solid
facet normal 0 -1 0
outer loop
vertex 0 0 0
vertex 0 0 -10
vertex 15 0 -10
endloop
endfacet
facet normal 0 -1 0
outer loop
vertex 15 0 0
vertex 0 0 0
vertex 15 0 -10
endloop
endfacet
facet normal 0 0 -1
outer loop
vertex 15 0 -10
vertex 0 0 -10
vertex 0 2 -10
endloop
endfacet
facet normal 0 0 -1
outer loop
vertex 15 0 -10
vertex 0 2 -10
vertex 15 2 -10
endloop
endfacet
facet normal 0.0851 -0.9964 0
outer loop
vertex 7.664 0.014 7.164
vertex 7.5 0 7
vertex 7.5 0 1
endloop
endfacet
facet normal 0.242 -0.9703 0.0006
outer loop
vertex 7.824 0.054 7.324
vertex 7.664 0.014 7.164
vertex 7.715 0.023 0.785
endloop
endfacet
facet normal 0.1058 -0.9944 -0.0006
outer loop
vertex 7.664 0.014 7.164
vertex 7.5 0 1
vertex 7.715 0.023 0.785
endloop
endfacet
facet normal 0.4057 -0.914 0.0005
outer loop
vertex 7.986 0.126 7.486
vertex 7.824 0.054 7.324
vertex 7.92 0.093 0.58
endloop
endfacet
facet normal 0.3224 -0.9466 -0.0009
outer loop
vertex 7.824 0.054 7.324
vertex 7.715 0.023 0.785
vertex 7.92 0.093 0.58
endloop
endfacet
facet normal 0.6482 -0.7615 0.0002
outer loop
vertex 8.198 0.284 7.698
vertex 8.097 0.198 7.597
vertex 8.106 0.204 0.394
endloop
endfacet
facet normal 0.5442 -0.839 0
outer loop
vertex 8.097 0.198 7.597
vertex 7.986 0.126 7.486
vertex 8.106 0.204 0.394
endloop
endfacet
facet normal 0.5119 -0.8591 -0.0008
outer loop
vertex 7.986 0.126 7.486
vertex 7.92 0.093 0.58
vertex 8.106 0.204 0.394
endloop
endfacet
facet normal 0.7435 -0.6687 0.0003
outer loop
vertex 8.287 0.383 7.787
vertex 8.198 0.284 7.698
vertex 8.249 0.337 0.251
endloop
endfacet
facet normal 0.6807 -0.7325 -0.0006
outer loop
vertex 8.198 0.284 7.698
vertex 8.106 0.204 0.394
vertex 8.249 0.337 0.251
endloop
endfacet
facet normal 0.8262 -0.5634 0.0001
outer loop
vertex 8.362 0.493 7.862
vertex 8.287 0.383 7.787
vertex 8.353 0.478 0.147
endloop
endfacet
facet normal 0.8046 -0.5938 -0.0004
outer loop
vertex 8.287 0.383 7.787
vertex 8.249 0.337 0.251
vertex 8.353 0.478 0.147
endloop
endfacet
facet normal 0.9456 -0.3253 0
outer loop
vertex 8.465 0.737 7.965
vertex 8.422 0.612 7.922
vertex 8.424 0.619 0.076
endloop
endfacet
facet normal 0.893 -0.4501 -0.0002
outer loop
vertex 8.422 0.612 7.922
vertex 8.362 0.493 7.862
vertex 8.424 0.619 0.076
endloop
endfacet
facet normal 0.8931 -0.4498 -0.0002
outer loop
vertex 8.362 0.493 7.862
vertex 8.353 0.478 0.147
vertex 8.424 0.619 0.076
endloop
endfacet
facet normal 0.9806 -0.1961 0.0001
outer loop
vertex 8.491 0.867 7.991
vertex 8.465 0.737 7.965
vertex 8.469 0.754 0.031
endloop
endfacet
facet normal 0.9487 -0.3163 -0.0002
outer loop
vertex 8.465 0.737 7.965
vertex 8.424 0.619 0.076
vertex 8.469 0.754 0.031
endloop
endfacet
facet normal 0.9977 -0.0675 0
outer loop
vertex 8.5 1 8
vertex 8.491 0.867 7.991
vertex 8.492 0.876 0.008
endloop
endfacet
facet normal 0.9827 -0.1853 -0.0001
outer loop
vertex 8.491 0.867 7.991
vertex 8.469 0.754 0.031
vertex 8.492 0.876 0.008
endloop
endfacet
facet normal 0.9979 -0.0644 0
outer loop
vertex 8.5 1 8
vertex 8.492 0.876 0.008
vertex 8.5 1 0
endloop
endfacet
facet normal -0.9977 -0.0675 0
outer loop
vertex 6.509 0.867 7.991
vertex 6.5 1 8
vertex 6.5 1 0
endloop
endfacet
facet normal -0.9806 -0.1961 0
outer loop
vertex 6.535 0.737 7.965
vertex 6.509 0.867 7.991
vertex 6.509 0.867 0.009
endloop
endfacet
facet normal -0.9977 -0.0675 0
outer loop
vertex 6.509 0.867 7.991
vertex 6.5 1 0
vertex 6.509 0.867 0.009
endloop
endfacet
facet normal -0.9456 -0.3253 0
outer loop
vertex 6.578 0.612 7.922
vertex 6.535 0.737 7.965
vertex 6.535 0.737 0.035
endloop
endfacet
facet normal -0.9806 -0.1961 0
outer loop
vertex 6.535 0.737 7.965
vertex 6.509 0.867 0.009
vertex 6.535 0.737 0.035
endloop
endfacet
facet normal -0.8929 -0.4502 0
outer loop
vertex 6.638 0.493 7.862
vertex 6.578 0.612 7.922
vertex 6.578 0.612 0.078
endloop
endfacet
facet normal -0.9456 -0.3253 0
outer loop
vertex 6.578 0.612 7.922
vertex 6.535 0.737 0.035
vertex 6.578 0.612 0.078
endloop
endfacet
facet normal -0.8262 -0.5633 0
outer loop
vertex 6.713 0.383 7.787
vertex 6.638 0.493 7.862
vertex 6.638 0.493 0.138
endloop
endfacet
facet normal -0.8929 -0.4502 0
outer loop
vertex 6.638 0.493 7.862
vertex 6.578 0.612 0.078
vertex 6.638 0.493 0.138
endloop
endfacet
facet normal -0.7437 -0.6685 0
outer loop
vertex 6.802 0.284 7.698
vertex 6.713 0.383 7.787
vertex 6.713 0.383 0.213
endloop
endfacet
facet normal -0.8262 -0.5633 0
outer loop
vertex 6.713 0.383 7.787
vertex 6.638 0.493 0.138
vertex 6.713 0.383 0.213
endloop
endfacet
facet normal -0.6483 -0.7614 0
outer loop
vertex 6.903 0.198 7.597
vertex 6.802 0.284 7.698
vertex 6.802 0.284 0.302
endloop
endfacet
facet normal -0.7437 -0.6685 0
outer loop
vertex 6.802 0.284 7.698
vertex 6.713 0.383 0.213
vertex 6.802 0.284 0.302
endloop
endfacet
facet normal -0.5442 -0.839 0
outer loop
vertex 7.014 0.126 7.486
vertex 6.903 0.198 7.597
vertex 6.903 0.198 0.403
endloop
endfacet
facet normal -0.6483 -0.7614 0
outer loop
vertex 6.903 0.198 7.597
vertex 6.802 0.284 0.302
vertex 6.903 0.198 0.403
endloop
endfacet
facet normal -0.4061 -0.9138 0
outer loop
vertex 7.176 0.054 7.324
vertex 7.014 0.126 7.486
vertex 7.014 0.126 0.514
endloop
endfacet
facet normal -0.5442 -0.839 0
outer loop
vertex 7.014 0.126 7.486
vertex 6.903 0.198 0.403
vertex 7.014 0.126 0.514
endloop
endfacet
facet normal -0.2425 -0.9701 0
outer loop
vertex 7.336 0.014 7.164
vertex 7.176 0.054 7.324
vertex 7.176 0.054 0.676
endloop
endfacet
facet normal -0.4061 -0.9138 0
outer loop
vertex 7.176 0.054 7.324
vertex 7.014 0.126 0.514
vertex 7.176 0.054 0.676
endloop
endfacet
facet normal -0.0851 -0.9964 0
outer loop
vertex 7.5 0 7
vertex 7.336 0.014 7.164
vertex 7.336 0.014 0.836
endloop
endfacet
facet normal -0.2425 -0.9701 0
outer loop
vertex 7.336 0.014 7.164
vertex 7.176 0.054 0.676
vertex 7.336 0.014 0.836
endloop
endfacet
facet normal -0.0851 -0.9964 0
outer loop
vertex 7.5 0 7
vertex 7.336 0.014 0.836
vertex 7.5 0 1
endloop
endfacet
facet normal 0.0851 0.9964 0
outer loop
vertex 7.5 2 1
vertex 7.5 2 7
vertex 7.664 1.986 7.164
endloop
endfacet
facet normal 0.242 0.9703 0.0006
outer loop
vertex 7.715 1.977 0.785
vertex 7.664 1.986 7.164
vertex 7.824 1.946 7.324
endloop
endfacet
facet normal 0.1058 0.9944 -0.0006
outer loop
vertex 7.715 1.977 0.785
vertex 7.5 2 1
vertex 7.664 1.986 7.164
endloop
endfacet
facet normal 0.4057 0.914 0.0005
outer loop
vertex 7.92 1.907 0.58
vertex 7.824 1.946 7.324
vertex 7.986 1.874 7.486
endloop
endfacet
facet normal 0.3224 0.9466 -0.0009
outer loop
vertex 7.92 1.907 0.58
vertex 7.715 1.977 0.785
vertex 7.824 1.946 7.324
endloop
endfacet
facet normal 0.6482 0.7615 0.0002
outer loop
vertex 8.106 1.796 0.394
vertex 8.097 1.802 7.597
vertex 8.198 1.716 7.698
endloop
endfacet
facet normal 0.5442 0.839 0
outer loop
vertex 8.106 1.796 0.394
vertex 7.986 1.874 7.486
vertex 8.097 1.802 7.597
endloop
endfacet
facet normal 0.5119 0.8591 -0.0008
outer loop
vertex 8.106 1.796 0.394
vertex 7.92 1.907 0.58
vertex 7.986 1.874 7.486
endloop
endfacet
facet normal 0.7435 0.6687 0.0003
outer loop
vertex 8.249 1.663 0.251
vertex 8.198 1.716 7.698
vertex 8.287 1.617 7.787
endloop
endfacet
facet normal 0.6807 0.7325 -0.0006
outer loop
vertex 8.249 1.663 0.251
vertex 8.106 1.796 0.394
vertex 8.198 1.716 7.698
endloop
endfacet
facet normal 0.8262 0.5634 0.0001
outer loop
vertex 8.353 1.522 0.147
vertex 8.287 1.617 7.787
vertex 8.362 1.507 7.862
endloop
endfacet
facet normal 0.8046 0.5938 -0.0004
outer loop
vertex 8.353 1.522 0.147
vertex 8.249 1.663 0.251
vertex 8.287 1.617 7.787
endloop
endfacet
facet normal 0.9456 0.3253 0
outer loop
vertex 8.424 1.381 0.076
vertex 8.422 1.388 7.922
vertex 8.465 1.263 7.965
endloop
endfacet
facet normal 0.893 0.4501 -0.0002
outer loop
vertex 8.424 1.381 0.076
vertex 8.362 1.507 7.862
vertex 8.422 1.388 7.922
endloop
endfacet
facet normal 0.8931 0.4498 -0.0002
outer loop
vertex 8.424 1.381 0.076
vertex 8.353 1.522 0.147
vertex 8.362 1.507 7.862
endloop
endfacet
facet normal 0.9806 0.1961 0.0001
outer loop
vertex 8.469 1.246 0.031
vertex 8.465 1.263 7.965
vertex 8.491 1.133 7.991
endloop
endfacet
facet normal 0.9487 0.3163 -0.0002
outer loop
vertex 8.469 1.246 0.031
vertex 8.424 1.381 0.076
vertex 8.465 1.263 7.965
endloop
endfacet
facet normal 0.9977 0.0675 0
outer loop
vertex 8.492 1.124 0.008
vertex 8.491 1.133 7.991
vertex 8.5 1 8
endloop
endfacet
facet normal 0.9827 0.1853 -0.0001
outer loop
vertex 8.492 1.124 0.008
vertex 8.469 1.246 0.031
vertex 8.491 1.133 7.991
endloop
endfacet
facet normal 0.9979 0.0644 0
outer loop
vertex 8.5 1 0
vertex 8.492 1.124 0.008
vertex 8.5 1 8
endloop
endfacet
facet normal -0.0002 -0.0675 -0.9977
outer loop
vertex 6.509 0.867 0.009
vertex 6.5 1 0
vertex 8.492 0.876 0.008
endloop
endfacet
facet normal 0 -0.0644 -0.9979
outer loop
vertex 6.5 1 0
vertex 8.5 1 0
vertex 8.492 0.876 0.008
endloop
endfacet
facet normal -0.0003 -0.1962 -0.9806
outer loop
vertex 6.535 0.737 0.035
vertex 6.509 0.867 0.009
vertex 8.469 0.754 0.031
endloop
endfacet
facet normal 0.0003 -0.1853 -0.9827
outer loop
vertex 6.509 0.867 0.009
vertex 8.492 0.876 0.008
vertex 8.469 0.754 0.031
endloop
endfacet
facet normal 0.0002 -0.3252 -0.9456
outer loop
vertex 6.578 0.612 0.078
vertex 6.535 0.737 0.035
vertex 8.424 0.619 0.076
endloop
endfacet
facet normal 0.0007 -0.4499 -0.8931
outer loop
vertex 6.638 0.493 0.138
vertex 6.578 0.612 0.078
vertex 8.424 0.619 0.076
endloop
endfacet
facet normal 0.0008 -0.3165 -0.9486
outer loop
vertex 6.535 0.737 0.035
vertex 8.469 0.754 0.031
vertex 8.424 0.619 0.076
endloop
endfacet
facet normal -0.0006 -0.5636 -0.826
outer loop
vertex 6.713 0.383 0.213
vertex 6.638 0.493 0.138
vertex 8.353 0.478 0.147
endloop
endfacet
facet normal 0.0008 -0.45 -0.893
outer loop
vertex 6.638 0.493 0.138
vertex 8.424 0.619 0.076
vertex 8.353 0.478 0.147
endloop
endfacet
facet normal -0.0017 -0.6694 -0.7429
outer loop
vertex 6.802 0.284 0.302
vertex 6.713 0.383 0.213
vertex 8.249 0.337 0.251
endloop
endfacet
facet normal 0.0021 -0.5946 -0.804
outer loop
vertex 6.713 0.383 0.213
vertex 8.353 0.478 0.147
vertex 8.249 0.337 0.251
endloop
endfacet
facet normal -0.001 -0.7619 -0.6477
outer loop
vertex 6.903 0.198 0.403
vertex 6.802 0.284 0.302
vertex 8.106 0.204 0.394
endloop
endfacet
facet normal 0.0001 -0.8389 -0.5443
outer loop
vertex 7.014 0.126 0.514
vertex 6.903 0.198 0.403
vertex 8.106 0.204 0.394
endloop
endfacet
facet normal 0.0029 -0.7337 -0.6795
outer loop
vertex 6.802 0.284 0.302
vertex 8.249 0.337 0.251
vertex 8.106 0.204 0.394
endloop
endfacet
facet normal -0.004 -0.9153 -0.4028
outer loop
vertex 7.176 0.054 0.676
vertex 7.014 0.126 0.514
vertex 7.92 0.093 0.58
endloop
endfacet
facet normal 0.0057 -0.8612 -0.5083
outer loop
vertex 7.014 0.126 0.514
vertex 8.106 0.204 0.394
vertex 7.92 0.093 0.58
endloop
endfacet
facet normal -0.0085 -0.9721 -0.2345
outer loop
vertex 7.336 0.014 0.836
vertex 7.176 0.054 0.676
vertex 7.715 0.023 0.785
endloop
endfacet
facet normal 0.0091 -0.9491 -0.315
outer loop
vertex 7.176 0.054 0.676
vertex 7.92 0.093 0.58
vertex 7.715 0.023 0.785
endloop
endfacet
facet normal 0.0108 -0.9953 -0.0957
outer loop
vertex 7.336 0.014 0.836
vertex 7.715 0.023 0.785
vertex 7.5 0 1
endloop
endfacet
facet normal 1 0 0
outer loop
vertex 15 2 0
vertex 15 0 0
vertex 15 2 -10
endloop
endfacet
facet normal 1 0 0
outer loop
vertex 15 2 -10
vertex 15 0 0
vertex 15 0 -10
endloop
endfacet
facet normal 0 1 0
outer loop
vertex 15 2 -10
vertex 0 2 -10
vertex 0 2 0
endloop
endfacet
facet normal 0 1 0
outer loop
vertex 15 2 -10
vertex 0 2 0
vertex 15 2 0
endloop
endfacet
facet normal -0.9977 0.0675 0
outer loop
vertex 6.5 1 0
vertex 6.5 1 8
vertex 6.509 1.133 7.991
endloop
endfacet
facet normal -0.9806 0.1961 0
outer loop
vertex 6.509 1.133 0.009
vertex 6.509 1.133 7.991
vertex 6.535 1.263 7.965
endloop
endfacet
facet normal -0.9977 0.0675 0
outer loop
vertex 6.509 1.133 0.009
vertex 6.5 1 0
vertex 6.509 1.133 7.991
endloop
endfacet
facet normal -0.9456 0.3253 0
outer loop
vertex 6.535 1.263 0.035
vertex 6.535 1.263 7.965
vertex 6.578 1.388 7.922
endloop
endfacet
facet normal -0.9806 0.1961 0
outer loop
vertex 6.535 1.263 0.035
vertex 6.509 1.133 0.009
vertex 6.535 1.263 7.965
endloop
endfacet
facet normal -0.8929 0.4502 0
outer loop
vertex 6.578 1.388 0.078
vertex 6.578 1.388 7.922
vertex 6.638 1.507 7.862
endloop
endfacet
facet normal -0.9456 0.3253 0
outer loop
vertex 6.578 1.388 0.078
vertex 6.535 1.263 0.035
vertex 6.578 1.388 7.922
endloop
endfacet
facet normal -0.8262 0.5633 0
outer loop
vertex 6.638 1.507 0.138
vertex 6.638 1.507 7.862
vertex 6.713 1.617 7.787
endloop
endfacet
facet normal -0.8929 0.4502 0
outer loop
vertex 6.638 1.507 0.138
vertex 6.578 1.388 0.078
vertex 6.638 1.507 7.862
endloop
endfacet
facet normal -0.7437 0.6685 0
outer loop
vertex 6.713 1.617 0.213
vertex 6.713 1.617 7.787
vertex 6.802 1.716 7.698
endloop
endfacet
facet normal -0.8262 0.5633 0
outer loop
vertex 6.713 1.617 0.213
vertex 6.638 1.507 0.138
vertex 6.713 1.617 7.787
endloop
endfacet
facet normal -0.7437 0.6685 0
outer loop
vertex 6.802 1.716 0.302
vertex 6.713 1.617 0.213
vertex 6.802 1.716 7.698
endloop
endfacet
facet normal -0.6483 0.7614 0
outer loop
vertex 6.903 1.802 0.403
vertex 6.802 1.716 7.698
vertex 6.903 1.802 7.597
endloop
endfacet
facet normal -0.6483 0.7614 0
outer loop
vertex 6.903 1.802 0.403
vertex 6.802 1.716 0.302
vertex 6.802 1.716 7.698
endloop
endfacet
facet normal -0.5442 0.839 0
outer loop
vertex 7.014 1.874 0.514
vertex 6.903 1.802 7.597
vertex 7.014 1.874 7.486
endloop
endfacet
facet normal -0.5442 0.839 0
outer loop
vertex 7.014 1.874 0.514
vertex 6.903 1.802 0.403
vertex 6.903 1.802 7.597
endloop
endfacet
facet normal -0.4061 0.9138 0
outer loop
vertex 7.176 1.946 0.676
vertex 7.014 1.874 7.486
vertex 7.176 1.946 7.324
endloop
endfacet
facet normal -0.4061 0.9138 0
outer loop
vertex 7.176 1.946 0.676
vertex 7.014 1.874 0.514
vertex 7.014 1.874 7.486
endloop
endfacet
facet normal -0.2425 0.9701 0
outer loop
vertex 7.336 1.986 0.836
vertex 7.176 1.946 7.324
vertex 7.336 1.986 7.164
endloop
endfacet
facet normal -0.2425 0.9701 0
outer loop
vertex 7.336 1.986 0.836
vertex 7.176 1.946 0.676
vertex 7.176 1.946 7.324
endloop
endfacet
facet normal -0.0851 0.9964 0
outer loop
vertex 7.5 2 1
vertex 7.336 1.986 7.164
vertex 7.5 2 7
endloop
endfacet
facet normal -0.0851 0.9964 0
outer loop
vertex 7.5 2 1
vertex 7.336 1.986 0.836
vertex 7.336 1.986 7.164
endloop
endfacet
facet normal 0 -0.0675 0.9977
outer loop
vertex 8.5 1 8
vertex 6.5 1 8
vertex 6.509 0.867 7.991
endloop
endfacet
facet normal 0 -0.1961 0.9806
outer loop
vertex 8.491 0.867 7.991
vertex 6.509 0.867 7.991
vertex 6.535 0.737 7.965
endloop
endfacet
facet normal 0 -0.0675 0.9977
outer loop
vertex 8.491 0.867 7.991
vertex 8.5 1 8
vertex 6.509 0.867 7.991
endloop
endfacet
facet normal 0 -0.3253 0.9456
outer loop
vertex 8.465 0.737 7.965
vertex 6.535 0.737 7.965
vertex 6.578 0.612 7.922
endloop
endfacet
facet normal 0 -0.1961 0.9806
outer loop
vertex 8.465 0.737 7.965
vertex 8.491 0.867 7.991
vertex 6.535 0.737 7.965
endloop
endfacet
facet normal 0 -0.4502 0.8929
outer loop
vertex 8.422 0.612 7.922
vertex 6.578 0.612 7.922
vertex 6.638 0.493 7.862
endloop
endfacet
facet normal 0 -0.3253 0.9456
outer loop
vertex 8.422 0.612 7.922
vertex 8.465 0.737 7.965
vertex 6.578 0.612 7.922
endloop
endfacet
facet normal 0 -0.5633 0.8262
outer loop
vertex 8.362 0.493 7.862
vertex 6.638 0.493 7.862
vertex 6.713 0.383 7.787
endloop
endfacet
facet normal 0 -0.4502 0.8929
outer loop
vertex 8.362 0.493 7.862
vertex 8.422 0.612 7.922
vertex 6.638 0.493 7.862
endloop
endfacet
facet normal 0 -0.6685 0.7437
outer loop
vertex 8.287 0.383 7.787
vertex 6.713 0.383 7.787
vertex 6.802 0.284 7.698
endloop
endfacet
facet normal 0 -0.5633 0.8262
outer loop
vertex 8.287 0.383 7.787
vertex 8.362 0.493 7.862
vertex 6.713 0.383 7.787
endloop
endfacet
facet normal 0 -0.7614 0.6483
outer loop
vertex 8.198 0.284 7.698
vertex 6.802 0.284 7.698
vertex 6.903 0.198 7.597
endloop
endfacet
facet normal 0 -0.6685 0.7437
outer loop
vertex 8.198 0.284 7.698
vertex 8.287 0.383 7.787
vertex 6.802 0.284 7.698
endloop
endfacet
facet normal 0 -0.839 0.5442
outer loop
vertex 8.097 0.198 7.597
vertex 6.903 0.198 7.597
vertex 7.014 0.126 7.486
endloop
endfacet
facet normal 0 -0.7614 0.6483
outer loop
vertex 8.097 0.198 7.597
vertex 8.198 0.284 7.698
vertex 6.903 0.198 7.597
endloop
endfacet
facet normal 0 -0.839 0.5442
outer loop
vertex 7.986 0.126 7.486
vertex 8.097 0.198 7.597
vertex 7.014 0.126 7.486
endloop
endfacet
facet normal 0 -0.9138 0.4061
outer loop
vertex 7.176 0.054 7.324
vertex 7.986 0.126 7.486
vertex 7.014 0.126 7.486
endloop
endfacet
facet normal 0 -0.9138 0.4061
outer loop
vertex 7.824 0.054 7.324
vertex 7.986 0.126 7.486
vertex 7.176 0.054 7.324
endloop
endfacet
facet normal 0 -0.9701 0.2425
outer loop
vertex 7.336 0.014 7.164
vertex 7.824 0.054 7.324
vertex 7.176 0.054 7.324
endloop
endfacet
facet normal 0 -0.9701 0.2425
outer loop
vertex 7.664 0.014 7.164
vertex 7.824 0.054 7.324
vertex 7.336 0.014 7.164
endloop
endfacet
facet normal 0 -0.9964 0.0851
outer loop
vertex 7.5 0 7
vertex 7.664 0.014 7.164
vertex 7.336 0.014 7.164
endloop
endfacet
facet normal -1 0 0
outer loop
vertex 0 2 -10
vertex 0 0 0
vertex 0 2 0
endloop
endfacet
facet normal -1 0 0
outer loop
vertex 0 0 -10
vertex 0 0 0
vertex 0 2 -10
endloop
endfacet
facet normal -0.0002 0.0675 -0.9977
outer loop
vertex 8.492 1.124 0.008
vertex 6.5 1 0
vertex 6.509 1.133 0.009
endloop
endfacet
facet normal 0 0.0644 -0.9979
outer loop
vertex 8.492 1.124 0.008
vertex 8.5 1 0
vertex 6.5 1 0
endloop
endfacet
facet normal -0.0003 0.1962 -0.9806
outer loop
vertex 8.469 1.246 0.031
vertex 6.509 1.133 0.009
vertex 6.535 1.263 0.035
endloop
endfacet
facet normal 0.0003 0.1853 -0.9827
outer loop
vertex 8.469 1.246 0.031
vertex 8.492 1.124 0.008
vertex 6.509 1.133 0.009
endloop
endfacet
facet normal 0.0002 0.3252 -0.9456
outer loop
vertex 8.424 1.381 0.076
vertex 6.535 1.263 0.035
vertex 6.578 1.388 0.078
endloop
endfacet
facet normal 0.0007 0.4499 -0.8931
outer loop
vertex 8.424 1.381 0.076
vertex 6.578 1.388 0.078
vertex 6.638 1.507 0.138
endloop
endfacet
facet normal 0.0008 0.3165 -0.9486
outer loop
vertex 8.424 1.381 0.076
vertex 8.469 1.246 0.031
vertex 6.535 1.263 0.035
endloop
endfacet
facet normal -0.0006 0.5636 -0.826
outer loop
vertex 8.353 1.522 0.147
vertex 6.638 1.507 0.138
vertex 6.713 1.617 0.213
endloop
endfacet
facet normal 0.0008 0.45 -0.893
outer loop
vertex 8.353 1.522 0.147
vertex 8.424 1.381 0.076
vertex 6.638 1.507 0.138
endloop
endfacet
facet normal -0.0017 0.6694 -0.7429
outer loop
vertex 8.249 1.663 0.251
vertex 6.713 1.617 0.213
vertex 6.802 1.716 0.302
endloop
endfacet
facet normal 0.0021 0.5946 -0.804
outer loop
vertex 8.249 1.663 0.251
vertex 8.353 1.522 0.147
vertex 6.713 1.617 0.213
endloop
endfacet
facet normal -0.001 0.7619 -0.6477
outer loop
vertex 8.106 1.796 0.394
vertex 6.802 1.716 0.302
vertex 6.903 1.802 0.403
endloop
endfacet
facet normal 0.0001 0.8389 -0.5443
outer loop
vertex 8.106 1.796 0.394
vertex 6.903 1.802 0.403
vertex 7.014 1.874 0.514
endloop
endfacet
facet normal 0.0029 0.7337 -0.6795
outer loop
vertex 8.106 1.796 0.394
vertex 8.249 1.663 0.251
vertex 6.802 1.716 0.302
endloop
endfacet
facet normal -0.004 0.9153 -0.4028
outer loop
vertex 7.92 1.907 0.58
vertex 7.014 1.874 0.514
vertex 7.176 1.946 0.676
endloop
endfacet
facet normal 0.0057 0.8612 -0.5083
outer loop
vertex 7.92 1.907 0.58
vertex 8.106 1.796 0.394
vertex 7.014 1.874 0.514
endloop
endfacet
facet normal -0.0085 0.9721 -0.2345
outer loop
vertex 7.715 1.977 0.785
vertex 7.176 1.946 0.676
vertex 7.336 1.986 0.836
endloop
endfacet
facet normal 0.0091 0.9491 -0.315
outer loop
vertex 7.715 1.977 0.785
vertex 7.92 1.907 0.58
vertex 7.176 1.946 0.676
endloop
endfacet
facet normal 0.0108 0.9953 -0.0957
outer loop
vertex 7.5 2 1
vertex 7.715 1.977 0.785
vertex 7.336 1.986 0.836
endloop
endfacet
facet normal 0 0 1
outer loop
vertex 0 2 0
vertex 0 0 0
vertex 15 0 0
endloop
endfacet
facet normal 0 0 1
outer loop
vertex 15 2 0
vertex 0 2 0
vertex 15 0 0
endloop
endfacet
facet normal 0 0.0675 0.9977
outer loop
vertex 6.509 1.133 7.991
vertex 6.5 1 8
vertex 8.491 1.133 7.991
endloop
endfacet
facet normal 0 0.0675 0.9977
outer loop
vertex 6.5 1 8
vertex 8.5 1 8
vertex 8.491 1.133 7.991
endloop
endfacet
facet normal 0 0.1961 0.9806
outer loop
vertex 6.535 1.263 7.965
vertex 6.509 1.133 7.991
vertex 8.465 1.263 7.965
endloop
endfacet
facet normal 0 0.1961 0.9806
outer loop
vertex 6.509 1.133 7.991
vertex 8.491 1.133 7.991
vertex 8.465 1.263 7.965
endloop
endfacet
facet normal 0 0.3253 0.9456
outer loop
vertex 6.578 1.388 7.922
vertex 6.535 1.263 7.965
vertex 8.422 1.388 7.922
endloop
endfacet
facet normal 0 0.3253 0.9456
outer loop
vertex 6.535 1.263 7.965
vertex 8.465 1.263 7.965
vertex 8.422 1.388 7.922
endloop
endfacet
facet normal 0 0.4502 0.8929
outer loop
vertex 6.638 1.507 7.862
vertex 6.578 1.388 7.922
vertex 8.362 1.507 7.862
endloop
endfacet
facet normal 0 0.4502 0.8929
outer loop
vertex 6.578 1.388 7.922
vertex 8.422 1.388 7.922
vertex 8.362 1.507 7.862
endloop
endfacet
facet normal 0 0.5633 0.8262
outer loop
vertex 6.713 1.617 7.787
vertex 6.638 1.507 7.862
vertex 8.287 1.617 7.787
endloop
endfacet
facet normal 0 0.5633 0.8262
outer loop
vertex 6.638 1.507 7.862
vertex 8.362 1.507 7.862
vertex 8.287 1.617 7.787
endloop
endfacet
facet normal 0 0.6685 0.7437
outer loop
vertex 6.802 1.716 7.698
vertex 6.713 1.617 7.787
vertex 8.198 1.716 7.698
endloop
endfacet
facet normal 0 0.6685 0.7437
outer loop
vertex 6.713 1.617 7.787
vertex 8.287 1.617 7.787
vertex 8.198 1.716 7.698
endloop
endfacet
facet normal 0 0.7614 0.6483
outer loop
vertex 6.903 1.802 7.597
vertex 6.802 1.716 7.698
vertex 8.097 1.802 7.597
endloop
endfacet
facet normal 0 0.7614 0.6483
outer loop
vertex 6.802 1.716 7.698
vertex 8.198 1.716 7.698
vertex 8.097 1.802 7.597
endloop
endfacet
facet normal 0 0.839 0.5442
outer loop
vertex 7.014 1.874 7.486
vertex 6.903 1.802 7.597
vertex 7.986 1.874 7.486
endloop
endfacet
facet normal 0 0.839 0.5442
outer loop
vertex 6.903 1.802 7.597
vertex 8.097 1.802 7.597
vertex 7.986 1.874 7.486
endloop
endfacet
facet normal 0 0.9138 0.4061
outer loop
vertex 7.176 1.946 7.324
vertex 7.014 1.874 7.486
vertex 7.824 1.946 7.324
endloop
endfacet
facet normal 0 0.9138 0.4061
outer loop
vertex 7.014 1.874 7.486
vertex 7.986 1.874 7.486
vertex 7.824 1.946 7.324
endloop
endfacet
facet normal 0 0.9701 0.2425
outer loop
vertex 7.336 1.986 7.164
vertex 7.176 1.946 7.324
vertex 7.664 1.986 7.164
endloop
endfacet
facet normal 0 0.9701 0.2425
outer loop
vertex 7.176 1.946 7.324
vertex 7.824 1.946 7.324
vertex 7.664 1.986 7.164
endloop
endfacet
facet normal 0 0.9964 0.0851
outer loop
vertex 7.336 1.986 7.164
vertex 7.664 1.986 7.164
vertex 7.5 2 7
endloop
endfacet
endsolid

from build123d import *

# Parameters (mm, degrees)
SKETCH1_W           = 15
SKETCH1_H           = 10
BOSS_EXTRUDE1_DEPTH = 2
SKETCH1_3_W         = 2
SKETCH1_3_H         = 8
BOSS_EXTRUDE2_DEPTH = 2
FILLET1_R           = 1


# Read off the part's stored shape, not the designer's step: Split1
with BuildPart() as part:
    # Sketch1 → Boss-Extrude1 (new body)
    with BuildSketch(Plane(origin=(0, 0, 0), x_dir=(1, 0, 0), z_dir=(0, 1, 0))):
        with Locations((7.5, 5)):
            Rectangle(SKETCH1_W, SKETCH1_H)
    extrude(amount=BOSS_EXTRUDE1_DEPTH)

    # Sketch1<3> → Boss-Extrude2 (add)
    with BuildSketch(Plane(origin=(0, 0, 0), x_dir=(1, 0, 0), z_dir=(0, 1, 0))):
        with Locations((7.5, -4)):
            Rectangle(SKETCH1_3_W, SKETCH1_3_H)
    extrude(amount=BOSS_EXTRUDE2_DEPTH)


with BuildPart() as body_2:
    # Split1: the piece on the far side of the plane
    add(part.part)
    split(bisect_by=Plane.XY, keep=Keep.BOTTOM)


with BuildPart() as part_1:
    add(part.part)

    # Split1
    split(bisect_by=Plane.XY, keep=Keep.TOP)

    # Fillet1
    fillet1_edges = [part_1.edges().sort_by_distance(p)[0] for p in [
        (7.5, 0, 8),
        (8.5, 0, 4),
        (6.5, 0, 4),
        (7.5, 2, 8),
        (8.5, 2, 4),
        (6.5, 2, 4),
        (7.5, 0, 0),
        (7.5, 2, 0),
    ]]
    fillet(fillet1_edges, radius=FILLET1_R - 0.0001)  # a hair under: the kernel refuses the full size


solid = Compound([body_2.part, part_1.part])
